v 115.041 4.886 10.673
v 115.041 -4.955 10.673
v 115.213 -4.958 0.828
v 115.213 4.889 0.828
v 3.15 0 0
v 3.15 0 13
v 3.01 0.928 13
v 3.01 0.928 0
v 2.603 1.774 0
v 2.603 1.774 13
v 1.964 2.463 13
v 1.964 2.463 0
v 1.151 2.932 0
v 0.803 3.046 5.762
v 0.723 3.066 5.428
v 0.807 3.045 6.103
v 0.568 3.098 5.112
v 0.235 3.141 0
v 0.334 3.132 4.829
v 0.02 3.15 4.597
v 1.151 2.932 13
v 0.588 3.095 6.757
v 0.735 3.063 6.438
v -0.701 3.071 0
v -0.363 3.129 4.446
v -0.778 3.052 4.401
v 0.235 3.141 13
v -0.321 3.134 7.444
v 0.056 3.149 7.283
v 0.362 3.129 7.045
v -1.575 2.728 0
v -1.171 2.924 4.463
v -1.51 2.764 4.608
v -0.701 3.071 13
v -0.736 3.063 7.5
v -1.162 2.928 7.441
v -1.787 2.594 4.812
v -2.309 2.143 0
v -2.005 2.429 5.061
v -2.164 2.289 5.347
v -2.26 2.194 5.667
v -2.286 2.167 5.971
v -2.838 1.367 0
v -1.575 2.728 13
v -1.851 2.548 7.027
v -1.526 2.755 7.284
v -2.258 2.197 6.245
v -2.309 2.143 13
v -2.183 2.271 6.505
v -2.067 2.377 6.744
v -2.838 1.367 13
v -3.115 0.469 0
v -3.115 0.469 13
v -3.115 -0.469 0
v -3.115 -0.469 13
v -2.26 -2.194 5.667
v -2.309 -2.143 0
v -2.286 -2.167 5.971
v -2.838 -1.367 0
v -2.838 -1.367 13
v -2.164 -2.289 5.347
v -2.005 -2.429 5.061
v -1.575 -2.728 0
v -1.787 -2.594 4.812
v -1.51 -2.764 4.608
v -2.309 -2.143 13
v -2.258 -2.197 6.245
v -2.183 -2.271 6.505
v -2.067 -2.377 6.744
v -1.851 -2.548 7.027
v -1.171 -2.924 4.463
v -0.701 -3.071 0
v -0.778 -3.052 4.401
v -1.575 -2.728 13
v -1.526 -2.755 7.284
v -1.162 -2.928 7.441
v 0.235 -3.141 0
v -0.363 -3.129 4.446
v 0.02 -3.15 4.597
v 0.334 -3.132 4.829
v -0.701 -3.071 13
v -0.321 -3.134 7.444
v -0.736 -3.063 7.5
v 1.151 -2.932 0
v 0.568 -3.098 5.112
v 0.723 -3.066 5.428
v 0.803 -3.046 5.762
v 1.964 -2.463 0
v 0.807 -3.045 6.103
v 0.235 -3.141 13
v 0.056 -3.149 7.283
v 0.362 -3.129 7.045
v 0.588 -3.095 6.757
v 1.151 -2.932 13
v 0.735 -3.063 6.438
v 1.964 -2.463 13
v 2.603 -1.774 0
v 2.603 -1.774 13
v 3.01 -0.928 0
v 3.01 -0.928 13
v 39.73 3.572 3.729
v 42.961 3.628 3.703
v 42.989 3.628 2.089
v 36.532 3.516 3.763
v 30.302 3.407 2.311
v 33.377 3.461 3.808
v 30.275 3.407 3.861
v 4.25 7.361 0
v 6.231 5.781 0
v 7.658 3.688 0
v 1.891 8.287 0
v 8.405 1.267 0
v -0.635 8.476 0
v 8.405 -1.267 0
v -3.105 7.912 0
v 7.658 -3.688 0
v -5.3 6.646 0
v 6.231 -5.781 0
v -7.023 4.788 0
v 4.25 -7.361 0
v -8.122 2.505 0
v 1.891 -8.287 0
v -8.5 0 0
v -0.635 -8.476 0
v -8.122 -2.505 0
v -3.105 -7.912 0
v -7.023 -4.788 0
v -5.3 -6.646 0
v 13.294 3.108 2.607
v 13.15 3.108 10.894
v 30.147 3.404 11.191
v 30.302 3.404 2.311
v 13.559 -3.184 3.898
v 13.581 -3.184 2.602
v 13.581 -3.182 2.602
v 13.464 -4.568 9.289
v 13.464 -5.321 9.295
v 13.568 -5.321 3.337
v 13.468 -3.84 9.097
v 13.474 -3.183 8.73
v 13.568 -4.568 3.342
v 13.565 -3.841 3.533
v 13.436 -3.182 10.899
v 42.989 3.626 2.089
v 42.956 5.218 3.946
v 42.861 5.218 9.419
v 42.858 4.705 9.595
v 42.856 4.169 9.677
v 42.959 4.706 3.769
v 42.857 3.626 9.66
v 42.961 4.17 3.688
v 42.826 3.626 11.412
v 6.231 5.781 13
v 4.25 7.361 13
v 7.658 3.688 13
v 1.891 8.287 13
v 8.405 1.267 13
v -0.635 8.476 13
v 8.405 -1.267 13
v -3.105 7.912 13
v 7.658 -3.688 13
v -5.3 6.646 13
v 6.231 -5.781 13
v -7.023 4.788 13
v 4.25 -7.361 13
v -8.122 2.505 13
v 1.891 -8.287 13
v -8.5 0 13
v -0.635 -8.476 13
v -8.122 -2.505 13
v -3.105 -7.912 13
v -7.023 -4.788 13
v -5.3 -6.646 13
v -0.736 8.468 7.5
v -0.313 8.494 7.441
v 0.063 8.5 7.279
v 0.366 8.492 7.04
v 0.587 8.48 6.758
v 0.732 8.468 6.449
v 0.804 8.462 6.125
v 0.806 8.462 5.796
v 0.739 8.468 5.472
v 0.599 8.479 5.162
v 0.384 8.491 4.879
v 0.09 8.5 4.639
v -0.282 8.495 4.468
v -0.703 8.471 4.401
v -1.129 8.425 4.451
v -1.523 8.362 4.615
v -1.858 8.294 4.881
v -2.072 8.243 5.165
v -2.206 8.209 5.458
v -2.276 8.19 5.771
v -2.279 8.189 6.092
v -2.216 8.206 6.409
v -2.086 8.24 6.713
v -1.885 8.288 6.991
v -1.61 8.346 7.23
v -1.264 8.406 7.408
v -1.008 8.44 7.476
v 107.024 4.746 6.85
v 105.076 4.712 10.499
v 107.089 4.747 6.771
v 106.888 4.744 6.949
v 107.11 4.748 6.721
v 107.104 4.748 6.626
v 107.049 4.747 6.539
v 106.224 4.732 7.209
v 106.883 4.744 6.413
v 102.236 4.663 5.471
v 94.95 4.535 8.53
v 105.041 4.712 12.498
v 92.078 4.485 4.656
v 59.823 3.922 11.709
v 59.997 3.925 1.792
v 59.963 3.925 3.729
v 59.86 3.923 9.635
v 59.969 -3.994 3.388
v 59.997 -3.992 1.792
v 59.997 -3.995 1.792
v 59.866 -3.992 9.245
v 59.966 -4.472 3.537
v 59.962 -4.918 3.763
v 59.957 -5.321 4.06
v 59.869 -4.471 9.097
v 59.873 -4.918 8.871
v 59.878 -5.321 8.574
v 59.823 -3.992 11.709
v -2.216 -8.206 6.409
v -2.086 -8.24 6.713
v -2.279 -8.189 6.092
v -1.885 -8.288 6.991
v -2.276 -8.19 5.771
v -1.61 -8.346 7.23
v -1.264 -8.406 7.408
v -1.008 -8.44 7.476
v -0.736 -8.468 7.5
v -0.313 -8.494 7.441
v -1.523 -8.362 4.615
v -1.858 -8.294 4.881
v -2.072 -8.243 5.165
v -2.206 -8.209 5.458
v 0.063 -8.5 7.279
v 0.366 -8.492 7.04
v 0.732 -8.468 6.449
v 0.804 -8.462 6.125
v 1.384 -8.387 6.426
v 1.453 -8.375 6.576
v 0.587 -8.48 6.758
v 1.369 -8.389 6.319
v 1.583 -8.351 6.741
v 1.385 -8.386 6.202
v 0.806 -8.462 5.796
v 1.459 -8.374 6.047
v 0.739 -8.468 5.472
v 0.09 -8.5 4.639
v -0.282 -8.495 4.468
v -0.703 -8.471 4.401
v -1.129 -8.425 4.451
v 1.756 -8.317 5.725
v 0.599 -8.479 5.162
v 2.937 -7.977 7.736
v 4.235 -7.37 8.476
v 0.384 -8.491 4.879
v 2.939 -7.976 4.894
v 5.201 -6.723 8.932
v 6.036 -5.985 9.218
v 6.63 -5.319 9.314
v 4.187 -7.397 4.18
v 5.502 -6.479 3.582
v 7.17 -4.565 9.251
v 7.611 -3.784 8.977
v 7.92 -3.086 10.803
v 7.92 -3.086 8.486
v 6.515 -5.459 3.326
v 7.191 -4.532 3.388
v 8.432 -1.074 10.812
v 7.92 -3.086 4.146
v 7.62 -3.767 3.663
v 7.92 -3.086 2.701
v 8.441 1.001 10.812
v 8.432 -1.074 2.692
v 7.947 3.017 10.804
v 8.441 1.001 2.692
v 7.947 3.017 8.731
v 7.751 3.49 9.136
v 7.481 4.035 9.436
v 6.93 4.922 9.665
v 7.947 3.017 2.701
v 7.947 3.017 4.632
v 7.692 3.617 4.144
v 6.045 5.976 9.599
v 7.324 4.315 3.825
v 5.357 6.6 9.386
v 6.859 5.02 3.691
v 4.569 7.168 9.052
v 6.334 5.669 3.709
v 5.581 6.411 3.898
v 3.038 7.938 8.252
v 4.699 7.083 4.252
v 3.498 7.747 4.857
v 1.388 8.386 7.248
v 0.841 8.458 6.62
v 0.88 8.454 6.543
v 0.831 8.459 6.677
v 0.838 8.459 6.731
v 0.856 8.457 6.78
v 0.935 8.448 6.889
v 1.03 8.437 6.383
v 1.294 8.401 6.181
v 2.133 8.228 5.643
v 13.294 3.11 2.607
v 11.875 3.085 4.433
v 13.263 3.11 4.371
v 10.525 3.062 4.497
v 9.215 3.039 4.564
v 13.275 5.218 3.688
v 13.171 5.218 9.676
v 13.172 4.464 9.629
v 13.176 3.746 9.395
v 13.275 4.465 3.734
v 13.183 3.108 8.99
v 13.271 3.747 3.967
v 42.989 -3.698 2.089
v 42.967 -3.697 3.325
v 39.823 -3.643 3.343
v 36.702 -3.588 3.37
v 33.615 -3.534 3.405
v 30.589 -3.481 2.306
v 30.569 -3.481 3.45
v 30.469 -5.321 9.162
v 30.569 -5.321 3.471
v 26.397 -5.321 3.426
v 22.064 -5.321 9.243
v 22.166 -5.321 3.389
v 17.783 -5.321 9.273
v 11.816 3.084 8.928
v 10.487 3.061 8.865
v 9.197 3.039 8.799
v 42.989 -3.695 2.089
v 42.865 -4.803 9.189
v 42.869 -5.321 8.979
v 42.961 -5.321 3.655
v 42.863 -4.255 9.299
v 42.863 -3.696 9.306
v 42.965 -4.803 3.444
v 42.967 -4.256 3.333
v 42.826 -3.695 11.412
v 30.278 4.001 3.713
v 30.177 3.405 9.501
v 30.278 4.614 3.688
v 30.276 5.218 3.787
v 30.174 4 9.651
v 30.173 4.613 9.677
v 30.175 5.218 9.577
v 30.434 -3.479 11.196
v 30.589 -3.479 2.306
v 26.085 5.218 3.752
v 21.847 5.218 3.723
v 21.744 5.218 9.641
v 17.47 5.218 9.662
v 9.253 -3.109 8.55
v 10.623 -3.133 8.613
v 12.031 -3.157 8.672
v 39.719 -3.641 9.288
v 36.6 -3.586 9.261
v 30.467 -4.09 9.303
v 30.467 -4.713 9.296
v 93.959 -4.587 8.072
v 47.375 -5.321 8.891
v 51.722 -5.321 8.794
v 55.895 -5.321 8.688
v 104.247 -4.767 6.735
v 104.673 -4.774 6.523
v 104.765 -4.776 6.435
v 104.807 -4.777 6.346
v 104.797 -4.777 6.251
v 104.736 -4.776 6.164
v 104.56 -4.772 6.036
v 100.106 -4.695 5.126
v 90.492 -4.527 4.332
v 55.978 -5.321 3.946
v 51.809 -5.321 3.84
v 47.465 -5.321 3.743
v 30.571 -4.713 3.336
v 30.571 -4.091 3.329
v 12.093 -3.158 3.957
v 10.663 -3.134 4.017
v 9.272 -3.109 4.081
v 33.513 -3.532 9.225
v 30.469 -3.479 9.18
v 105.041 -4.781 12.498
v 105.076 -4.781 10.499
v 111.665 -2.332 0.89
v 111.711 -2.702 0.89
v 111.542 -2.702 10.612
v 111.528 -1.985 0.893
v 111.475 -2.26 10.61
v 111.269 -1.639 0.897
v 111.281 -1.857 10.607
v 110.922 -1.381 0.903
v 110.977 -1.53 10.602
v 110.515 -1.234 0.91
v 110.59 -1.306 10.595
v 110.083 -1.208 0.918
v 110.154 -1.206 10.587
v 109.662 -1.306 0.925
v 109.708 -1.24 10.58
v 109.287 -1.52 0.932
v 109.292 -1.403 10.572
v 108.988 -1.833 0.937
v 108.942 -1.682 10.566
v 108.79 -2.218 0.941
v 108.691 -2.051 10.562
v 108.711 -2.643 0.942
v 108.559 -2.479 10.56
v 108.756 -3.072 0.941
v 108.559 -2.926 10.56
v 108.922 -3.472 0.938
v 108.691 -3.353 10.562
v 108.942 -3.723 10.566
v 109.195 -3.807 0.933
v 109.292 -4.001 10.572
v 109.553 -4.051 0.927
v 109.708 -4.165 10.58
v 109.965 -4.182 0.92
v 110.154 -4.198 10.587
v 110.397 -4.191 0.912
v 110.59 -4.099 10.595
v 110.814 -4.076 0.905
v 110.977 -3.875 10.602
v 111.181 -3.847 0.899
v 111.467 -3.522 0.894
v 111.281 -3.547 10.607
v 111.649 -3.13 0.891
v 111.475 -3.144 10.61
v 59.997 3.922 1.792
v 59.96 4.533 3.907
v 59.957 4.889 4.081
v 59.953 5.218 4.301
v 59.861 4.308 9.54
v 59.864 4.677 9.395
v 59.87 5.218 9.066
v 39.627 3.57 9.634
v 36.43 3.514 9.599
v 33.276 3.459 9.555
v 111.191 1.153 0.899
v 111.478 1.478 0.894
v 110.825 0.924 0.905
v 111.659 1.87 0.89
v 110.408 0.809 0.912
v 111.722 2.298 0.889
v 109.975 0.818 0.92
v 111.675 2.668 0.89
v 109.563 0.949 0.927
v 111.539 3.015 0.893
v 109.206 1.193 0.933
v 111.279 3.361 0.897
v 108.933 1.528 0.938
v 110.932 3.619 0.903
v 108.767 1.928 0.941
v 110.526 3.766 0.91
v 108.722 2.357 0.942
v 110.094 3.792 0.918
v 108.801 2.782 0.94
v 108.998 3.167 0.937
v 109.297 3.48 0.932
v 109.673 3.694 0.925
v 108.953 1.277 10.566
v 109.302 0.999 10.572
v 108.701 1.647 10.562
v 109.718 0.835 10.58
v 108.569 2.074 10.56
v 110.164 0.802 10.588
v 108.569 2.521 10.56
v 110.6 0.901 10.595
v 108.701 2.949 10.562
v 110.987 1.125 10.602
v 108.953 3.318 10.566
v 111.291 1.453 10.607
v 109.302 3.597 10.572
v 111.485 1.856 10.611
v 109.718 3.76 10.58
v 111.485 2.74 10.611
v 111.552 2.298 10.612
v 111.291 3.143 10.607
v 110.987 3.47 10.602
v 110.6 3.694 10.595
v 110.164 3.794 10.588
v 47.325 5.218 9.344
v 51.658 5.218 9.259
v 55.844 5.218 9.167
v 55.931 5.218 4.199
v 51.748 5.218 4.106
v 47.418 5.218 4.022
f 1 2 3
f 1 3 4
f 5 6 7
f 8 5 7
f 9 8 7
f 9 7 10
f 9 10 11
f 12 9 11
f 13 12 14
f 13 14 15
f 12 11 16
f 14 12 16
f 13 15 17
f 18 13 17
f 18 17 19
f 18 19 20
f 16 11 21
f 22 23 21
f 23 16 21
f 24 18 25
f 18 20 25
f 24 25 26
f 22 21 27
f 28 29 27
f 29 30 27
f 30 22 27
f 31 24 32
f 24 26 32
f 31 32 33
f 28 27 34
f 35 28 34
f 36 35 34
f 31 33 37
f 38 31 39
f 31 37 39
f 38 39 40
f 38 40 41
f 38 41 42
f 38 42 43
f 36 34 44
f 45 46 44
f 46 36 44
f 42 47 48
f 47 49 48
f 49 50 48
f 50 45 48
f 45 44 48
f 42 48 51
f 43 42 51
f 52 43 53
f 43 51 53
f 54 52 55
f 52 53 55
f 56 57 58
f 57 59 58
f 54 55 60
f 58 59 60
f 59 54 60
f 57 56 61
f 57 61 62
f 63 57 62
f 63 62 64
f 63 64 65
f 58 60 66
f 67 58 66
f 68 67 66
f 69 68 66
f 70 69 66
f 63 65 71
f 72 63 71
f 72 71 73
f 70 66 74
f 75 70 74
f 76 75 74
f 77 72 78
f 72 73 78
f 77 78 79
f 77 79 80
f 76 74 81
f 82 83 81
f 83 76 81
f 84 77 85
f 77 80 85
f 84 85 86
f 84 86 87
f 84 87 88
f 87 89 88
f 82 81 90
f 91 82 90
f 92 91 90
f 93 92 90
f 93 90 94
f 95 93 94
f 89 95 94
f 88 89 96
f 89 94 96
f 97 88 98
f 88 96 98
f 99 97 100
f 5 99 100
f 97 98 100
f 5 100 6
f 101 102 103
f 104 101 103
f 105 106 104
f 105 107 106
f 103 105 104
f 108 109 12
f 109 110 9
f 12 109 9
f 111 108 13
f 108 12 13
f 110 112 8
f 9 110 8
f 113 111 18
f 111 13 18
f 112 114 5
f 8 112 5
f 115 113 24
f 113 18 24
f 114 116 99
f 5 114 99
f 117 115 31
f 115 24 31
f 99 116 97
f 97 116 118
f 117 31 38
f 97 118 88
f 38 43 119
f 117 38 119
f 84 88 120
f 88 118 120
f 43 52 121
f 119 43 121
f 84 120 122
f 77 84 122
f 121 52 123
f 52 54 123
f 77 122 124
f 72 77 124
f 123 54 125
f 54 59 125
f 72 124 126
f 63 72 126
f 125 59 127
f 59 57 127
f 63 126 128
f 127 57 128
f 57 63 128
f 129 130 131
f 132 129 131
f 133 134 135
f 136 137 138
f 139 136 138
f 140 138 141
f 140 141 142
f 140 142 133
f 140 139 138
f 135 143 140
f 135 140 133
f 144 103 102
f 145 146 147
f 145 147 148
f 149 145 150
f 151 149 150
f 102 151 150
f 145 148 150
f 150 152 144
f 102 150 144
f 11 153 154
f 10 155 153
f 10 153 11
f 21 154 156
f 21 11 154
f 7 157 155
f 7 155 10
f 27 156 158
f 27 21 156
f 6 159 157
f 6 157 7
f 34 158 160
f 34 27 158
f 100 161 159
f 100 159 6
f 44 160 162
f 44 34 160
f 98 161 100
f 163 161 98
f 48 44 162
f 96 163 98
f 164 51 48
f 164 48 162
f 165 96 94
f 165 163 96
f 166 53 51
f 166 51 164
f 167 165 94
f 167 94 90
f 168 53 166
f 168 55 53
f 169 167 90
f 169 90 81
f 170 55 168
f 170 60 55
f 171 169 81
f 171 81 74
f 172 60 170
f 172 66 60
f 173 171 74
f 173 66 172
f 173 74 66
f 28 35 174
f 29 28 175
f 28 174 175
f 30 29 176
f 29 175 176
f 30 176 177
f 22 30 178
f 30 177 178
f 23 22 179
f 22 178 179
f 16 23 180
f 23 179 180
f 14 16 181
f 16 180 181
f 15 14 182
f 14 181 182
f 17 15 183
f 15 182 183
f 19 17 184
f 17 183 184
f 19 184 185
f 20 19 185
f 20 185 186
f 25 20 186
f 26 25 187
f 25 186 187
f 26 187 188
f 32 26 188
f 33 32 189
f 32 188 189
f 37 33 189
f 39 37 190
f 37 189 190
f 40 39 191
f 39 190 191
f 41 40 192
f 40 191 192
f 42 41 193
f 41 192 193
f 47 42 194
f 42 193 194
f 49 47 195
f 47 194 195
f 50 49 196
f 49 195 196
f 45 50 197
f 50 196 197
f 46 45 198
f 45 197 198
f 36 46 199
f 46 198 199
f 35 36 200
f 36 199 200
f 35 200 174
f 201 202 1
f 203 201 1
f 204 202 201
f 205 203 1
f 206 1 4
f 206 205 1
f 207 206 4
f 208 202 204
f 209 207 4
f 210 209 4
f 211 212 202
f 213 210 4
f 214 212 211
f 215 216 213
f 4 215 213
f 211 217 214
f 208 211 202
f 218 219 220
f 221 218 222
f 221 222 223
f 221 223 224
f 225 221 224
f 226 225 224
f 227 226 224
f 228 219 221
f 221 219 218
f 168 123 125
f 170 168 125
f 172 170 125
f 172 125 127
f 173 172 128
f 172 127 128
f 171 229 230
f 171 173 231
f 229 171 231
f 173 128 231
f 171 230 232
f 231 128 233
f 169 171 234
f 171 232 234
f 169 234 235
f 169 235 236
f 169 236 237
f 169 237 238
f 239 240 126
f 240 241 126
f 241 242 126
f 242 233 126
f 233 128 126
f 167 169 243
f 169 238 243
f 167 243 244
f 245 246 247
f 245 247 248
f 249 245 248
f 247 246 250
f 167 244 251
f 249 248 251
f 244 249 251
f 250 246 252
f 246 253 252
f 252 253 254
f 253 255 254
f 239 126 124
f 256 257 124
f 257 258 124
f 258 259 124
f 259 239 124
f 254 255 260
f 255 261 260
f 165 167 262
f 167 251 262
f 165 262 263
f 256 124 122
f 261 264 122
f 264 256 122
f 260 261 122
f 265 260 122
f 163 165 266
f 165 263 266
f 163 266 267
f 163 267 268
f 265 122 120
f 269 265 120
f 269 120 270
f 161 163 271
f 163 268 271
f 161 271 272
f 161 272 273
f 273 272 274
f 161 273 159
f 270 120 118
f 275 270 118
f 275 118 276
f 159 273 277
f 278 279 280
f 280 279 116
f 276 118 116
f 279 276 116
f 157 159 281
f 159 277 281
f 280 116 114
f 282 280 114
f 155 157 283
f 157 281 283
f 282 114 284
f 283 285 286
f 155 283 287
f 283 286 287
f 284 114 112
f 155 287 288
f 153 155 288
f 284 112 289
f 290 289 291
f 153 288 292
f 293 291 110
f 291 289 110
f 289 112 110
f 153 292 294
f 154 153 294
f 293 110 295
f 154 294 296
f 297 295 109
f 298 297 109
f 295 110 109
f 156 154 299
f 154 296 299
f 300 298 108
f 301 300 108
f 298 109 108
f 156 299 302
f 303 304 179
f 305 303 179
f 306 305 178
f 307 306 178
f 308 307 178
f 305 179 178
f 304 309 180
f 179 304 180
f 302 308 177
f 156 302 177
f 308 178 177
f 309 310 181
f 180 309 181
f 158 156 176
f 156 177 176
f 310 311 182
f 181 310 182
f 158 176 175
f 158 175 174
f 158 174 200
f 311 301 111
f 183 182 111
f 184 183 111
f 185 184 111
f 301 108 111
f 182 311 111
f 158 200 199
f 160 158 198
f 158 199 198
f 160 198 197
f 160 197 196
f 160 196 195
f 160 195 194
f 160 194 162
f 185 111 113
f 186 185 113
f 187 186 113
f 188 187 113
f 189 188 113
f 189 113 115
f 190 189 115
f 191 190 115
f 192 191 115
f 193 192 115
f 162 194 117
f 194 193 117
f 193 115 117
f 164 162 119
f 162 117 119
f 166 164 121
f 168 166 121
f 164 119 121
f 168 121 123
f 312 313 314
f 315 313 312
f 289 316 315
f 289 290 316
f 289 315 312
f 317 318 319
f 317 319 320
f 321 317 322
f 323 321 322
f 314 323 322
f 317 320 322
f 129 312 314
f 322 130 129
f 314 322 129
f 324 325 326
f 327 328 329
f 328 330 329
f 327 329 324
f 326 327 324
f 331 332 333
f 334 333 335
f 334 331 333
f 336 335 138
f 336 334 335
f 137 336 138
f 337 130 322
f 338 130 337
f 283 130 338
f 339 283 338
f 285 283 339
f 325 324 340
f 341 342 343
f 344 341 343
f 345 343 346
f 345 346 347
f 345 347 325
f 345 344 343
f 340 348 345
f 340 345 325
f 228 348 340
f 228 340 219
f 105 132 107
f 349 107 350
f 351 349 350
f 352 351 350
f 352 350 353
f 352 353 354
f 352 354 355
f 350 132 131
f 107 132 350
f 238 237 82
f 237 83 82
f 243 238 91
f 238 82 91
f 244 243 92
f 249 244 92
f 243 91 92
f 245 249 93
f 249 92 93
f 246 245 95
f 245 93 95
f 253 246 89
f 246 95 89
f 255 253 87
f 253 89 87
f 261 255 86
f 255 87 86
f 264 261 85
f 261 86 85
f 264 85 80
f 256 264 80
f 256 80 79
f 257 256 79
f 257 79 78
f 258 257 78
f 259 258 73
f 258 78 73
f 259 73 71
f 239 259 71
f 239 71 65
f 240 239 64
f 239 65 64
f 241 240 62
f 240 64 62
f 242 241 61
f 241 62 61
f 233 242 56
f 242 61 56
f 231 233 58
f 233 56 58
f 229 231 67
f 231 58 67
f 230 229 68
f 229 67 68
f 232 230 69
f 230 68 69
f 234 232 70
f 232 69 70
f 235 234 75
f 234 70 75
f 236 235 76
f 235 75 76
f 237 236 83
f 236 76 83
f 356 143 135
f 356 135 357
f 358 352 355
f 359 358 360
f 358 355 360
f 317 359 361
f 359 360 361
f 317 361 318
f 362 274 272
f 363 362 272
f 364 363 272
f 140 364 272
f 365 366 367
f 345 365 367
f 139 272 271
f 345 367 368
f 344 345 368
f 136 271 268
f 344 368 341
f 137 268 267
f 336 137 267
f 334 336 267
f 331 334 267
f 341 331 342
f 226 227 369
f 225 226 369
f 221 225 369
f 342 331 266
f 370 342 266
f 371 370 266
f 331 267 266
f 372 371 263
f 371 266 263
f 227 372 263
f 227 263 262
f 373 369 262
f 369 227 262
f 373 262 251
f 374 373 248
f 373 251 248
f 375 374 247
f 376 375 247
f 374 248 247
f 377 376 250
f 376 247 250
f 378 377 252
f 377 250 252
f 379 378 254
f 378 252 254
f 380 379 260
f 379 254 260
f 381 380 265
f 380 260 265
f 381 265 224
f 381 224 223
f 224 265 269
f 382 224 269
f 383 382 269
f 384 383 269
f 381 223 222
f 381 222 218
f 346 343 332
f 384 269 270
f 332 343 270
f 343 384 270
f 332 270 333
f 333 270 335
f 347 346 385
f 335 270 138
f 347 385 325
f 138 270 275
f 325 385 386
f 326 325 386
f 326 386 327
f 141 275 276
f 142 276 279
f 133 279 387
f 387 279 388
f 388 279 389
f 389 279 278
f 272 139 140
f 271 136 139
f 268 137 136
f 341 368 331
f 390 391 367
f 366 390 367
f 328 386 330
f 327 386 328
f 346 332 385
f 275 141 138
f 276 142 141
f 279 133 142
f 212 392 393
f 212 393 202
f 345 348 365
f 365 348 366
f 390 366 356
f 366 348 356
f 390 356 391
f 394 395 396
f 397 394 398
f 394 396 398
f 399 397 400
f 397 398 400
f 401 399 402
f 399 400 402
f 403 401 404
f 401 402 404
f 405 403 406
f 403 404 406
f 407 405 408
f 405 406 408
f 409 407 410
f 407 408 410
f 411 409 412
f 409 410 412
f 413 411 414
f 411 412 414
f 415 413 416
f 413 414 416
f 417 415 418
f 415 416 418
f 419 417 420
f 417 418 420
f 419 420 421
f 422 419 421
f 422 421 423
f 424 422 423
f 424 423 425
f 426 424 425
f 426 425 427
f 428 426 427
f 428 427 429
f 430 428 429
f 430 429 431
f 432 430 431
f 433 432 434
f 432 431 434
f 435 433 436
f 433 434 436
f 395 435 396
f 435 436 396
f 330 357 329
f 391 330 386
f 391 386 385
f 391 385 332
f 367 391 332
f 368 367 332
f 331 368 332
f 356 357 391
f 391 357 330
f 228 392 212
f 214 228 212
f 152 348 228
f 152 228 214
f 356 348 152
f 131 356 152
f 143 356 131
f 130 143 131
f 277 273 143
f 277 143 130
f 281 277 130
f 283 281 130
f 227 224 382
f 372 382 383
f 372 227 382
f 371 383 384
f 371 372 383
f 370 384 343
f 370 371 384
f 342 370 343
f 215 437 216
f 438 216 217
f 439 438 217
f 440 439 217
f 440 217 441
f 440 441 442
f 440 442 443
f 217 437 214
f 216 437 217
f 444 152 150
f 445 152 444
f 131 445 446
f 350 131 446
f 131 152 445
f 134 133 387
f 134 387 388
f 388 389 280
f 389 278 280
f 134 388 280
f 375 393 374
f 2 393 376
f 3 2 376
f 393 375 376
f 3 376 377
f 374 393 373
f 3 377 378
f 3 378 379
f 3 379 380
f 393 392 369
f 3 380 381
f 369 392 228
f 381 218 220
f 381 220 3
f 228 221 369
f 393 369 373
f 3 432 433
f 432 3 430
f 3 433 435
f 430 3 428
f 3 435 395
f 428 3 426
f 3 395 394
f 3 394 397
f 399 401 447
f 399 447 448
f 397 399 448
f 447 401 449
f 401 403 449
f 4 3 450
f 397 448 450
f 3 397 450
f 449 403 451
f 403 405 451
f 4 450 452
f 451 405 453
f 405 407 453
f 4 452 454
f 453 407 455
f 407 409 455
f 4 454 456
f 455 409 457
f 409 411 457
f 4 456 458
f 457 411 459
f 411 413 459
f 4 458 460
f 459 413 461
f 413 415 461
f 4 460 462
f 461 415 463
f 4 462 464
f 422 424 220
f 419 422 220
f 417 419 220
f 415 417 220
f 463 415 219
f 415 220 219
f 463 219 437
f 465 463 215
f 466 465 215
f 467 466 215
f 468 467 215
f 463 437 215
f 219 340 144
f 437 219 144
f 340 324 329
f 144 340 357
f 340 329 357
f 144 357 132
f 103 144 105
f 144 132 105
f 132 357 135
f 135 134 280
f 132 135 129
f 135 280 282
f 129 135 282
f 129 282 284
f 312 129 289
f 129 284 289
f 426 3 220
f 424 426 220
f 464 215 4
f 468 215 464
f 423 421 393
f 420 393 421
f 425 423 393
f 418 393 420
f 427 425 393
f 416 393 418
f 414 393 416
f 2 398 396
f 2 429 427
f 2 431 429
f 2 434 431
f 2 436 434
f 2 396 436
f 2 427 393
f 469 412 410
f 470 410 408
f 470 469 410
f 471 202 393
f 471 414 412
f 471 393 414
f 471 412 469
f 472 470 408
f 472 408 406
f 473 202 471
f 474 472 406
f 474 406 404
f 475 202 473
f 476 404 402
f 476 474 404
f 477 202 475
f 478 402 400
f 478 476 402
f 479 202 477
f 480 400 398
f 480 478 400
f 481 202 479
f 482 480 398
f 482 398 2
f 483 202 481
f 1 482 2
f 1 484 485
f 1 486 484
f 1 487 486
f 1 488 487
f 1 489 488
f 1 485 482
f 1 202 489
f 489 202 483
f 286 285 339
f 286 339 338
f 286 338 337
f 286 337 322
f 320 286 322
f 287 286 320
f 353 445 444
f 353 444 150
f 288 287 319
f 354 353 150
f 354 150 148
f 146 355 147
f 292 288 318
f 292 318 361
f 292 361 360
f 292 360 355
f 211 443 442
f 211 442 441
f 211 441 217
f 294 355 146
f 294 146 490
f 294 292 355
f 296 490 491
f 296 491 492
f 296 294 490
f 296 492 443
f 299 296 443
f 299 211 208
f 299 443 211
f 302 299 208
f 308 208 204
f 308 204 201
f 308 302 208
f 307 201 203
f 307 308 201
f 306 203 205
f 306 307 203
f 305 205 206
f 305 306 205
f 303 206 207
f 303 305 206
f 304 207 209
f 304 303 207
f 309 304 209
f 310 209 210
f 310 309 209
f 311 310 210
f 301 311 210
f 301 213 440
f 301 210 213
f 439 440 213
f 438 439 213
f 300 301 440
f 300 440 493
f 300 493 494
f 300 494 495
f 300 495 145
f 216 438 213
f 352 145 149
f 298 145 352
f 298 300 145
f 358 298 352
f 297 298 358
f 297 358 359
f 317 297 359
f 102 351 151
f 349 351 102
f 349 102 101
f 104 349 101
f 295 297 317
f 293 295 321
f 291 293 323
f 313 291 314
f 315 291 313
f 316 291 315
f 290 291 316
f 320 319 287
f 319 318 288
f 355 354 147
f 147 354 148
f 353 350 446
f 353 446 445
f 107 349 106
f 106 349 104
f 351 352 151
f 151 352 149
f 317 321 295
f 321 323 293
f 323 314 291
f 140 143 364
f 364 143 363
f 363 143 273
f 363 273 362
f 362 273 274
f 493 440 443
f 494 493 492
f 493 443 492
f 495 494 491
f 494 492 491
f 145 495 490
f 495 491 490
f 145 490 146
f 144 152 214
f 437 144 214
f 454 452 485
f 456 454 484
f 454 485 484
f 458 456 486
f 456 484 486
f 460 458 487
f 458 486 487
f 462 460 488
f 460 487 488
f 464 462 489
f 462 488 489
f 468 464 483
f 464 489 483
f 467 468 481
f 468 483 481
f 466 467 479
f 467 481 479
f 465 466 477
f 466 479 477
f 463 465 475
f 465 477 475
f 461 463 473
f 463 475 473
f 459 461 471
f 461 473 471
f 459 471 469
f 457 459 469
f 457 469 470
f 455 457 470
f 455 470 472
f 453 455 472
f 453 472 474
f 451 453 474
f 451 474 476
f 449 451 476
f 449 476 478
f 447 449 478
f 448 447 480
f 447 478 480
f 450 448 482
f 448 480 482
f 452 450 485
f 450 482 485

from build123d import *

# Parameters (mm, degrees)
SKETCH2_R           = 8.5
BOSS_EXTRUDE1_DEPTH = 13
SKETCH4_W           = 8
SKETCH4_H           = 6
BOSS_EXTRUDE2_DEPTH = 150
BOSS_EXTRUDE2_DRAFT = -1
SKETCH6_R           = 3
BOSS_EXTRUDE3_DEPTH = 120
SKETCH7_R           = 3
BOSS_EXTRUDE4_DEPTH = 120
CUT_EXTRUDE2_REACH  = 157.776
SKETCH8_R           = 3.15
CUT_EXTRUDE3_REACH  = 157.784
CUT_EXTRUDE6_REACH  = 158.041
SKETCH12_W          = 10
SKETCH12_H          = 2.051798714
CUT_EXTRUDE7_REACH  = 157.784
SKETCH13_W          = 43.706918827
SKETCH13_H          = 28.028328295
SKETCH14_W          = 10
SKETCH14_H          = 13.868841859
CUT_EXTRUDE8_DEPTH  = 2
CUT_EXTRUDE9_REACH  = 118.001
SKETCH15_R          = 1.5
SKETCH16_R          = 1.55
CUT_EXTRUDE10_DEPTH = 10


with BuildPart() as part:
    # Sketch2 → Boss-Extrude1 (new body)
    with BuildSketch(Plane.XY):
        with Locations(Location((0, 0, 0), (0, 0, 180))):
            Circle(SKETCH2_R)
    extrude(amount=BOSS_EXTRUDE1_DEPTH)


with BuildPart() as boss_extrude2_tool:
    # Sketch4 → Boss-Extrude2 (with draft: the straight prism first)
    with BuildSketch(Plane(origin=(5, 0, 0), x_dir=(0, 0, -1), z_dir=(1, 0, 0))):
        with Locations((-6.752185146, -0.034660359)):
            Rectangle(SKETCH4_W, SKETCH4_H)
    extrude(amount=BOSS_EXTRUDE2_DEPTH)
    # Boss-Extrude2: the draft: its side faces are tilted about the plane it starts from
    boss_extrude2_sides = [boss_extrude2_tool.faces().sort_by_distance(p)[0] for p in [
        (80, -0.034660359, 10.752185146),
        (80, -3.034660359, 6.752185146),
        (80, -0.034660359, 2.752185146),
        (80, 2.965339641, 6.752185146),
    ]]
    draft(boss_extrude2_sides, Plane(origin=(5, 0, 0), x_dir=(0, 0, -1), z_dir=(1, 0, 0)), BOSS_EXTRUDE2_DRAFT)


with BuildPart() as part_1:
    add(part.part)

    # Boss-Extrude2: add boss_extrude2_tool
    add(boss_extrude2_tool.part)

    # Sketch6 → Boss-Extrude3 (add)
    with BuildSketch(Plane(origin=(0, 0, 0), x_dir=(0, 0, 1), z_dir=(-0.999390827019096, 0.034899496702494044, 0))):
        with Locations((6.68193283, 5.483107785)):
            Circle(SKETCH6_R)
    extrude(amount=-BOSS_EXTRUDE3_DEPTH)

    # Sketch7 → Boss-Extrude4 (add)
    with BuildSketch(Plane(origin=(0, 0, 0), x_dir=(0, 0, 1), z_dir=(0.9993908270190958, 0.034899496702501046, 0))):
        with Locations((6.315850074, 5.431762479)):
            Circle(SKETCH7_R)
    extrude(amount=BOSS_EXTRUDE4_DEPTH)

    # Sketch8 → Cut-Extrude2 (cut, up to next)
    with BuildSketch(Plane.XY.offset(13), mode=Mode.PRIVATE) as cut_extrude2_sk1:
        Circle(SKETCH8_R)
    cut_extrude2_tool1 = extrude(cut_extrude2_sk1.sketch, amount=-CUT_EXTRUDE2_REACH, mode=Mode.PRIVATE) & part_1.part
    add(cut_extrude2_tool1.solids().sort_by_distance((0, 0, 13))[0], mode=Mode.SUBTRACT)

    # Sketch9 → Cut-Extrude3 (cut, up to next)
    with BuildSketch(Plane(origin=(-0.186099993, 0, 10.661661434), x_dir=(0.9998476951563913, 0, 0.01745240643728355), z_dir=(-0.01745240643728355, 0, 0.9998476951563913)), mode=Mode.PRIVATE) as cut_extrude3_sk1:
        Polygon((13.337744906, 3.107591674), (30.337744906, 3.404282584), (30.337744906, 5.218463822), (13.337744906, 5.218463822), align=None)
    cut_extrude3_tool1 = extrude(cut_extrude3_sk1.sketch, amount=-CUT_EXTRUDE3_REACH, mode=Mode.PRIVATE) & part_1.part
    # Sketch9 → Cut-Extrude3 (cut, up to next)
    with BuildSketch(Plane(origin=(-0.186099993, 0, 10.661661434), x_dir=(0.9998476951563913, 0, 0.01745240643728355), z_dir=(-0.01745240643728355, 0, 0.9998476951563913)), mode=Mode.PRIVATE) as cut_extrude3_sk2:
        Polygon((43.018729252, 3.625596277), (60.018729252, 3.922287186), (60.018729252, 5.218463822), (43.018729252, 5.218463822), align=None)
    cut_extrude3_tool2 = extrude(cut_extrude3_sk2.sketch, amount=-CUT_EXTRUDE3_REACH, mode=Mode.PRIVATE) & part_1.part
    # Sketch9 → Cut-Extrude3 (cut, up to next)
    with BuildSketch(Plane(origin=(-0.186099993, 0, 10.661661434), x_dir=(0.9998476951563913, 0, 0.01745240643728355), z_dir=(-0.01745240643728355, 0, 0.9998476951563913)), mode=Mode.PRIVATE) as cut_extrude3_sk3:
        Polygon((13.624548626, -3.181917807), (30.624548626, -3.478608716), (30.624548626, -5.320643976), (13.624548626, -5.320643976), align=None)
    cut_extrude3_tool3 = extrude(cut_extrude3_sk3.sketch, amount=-CUT_EXTRUDE3_REACH, mode=Mode.PRIVATE) & part_1.part
    # Sketch9 → Cut-Extrude3 (cut, up to next)
    with BuildSketch(Plane(origin=(-0.186099993, 0, 10.661661434), x_dir=(0.9998476951563913, 0, 0.01745240643728355), z_dir=(-0.01745240643728355, 0, 0.9998476951563913)), mode=Mode.PRIVATE) as cut_extrude3_sk4:
        Polygon((43.018729252, -3.694916994), (60.018729252, -3.991607903), (60.018729252, -5.320643976), (43.018729252, -5.320643976), align=None)
    cut_extrude3_tool4 = extrude(cut_extrude3_sk4.sketch, amount=-CUT_EXTRUDE3_REACH, mode=Mode.PRIVATE) & part_1.part
    add(cut_extrude3_tool1.solids().sort_by_distance((21.434183, 4.235332, 11.039045))[0], mode=Mode.SUBTRACT)
    add(cut_extrude3_tool2.solids().sort_by_distance((51.033857, 4.493664, 11.555709))[0], mode=Mode.SUBTRACT)
    add(cut_extrude3_tool3.solids().sort_by_distance((21.723939, -4.323611, 11.044103))[0], mode=Mode.SUBTRACT)
    add(cut_extrude3_tool4.solids().sort_by_distance((51.040328, -4.579471, 11.555822))[0], mode=Mode.SUBTRACT)

    # Cut-Extrude6: up to this plane
    cut_extrude6_end = Plane(origin=(5, -3.034660359, 10.752185146), z_dir=(-0.01745240643728355, -0.9998476951563913, 0))
    # Sketch12 → Cut-Extrude6 (cut, up to the surface)
    with BuildSketch(Plane(origin=(-0.050221498, 2.877187697, 0), x_dir=(0.9998476951563913, 0.01745240643728355, 0), z_dir=(-0.01745240643728355, 0.9998476951563913, 0)), mode=Mode.PRIVATE) as cut_extrude6_sk1:
        with Locations((141.40635612, -10.3349379)):
            Rectangle(SKETCH12_W, SKETCH12_H)
    cut_extrude6_tool1 = split(extrude(cut_extrude6_sk1.sketch, amount=-CUT_EXTRUDE6_REACH, mode=Mode.PRIVATE), bisect_by=cut_extrude6_end, keep=Keep.BOTH, mode=Mode.PRIVATE)
    add(cut_extrude6_tool1.solids().sort_by_distance((141.334598, 5.345069, 10.334938))[0], mode=Mode.SUBTRACT)

    # Cut-Extrude7: up to this plane
    cut_extrude7_end = Plane(origin=(5, 2.965339641, 2.752185146), z_dir=(-0.01745240643728355, 0, -0.9998476951563913))
    # Sketch13 → Cut-Extrude7 (cut, up to the surface)
    with BuildSketch(Plane(origin=(-0.186099993, 0, 10.661661434), x_dir=(0.9998476951563913, 0, 0.01745240643728355), z_dir=(-0.01745240643728355, 0, 0.9998476951563913)), mode=Mode.PRIVATE) as cut_extrude7_sk1:
        with Locations((137.063198602, -4.734636569)):
            Rectangle(SKETCH13_W, SKETCH13_H)
    cut_extrude7_tool1 = split(extrude(cut_extrude7_sk1.sketch, amount=-CUT_EXTRUDE7_REACH, mode=Mode.PRIVATE), bisect_by=cut_extrude7_end, keep=Keep.BOTH, mode=Mode.PRIVATE)
    add(cut_extrude7_tool1.solids().sort_by_distance((136.856223, -4.734637, 13.053744))[0], mode=Mode.SUBTRACT)

    # Sketch14 → Cut-Extrude8 (cut)
    with BuildSketch(Plane(origin=(-0.186099993, 0, 10.661661434), x_dir=(0.9998476951563913, 0, 0.01745240643728355), z_dir=(-0.01745240643728355, 0, 0.9998476951563913))):
        with Locations((110.243167646, 0.778255403)):
            Rectangle(SKETCH14_W, SKETCH14_H)
    extrude(amount=-CUT_EXTRUDE8_DEPTH, mode=Mode.SUBTRACT)

    # Cut-Extrude9: up to this plane
    cut_extrude9_end = Plane(origin=(5, 2.965339641, 2.752185146), z_dir=(-0.01745240643728355, 0, -0.9998476951563913))
    # Sketch15 → Cut-Extrude9 (cut, up to the surface)
    with BuildSketch(Plane(origin=(-0.15119518, 0, 8.661966044), x_dir=(0.9998476951563913, 0, 0.017452406437283588), z_dir=(-0.017452406437283588, 0, 0.9998476951563913)), mode=Mode.PRIVATE) as cut_extrude9_sk1:
        with Locations((110.220200994, 2.297708244)):
            Circle(SKETCH15_R)
    cut_extrude9_tool1 = split(extrude(cut_extrude9_sk1.sketch, amount=-CUT_EXTRUDE9_REACH, mode=Mode.PRIVATE), bisect_by=cut_extrude9_end, keep=Keep.BOTH, mode=Mode.PRIVATE)
    add(cut_extrude9_tool1.solids().sort_by_distance((110.052219, 2.297708, 10.585574))[0], mode=Mode.SUBTRACT)
    # Sketch15 → Cut-Extrude9 (cut, up to the surface)
    with BuildSketch(Plane(origin=(-0.15119518, 0, 8.661966044), x_dir=(0.9998476951563913, 0, 0.017452406437283588), z_dir=(-0.017452406437283588, 0, 0.9998476951563913)), mode=Mode.PRIVATE) as cut_extrude9_sk2:
        with Locations((110.209739188, -2.702291756)):
            Circle(SKETCH15_R)
    cut_extrude9_tool2 = split(extrude(cut_extrude9_sk2.sketch, amount=-CUT_EXTRUDE9_REACH, mode=Mode.PRIVATE), bisect_by=cut_extrude9_end, keep=Keep.BOTH, mode=Mode.PRIVATE)
    add(cut_extrude9_tool2.solids().sort_by_distance((110.041759, -2.702292, 10.585391))[0], mode=Mode.SUBTRACT)

    # Sketch16 → Cut-Extrude10 (cut, symmetric)
    with BuildSketch(Plane(origin=(0, 0, 0), x_dir=(1, 0, 0), z_dir=(0, 1, 0))):
        with Locations(Location((-0.73595313, -5.950294761, 0), (0, 0, 270))):
            Circle(SKETCH16_R)
    extrude(amount=CUT_EXTRUDE10_DEPTH, both=True, mode=Mode.SUBTRACT)


solid = part_1.part
